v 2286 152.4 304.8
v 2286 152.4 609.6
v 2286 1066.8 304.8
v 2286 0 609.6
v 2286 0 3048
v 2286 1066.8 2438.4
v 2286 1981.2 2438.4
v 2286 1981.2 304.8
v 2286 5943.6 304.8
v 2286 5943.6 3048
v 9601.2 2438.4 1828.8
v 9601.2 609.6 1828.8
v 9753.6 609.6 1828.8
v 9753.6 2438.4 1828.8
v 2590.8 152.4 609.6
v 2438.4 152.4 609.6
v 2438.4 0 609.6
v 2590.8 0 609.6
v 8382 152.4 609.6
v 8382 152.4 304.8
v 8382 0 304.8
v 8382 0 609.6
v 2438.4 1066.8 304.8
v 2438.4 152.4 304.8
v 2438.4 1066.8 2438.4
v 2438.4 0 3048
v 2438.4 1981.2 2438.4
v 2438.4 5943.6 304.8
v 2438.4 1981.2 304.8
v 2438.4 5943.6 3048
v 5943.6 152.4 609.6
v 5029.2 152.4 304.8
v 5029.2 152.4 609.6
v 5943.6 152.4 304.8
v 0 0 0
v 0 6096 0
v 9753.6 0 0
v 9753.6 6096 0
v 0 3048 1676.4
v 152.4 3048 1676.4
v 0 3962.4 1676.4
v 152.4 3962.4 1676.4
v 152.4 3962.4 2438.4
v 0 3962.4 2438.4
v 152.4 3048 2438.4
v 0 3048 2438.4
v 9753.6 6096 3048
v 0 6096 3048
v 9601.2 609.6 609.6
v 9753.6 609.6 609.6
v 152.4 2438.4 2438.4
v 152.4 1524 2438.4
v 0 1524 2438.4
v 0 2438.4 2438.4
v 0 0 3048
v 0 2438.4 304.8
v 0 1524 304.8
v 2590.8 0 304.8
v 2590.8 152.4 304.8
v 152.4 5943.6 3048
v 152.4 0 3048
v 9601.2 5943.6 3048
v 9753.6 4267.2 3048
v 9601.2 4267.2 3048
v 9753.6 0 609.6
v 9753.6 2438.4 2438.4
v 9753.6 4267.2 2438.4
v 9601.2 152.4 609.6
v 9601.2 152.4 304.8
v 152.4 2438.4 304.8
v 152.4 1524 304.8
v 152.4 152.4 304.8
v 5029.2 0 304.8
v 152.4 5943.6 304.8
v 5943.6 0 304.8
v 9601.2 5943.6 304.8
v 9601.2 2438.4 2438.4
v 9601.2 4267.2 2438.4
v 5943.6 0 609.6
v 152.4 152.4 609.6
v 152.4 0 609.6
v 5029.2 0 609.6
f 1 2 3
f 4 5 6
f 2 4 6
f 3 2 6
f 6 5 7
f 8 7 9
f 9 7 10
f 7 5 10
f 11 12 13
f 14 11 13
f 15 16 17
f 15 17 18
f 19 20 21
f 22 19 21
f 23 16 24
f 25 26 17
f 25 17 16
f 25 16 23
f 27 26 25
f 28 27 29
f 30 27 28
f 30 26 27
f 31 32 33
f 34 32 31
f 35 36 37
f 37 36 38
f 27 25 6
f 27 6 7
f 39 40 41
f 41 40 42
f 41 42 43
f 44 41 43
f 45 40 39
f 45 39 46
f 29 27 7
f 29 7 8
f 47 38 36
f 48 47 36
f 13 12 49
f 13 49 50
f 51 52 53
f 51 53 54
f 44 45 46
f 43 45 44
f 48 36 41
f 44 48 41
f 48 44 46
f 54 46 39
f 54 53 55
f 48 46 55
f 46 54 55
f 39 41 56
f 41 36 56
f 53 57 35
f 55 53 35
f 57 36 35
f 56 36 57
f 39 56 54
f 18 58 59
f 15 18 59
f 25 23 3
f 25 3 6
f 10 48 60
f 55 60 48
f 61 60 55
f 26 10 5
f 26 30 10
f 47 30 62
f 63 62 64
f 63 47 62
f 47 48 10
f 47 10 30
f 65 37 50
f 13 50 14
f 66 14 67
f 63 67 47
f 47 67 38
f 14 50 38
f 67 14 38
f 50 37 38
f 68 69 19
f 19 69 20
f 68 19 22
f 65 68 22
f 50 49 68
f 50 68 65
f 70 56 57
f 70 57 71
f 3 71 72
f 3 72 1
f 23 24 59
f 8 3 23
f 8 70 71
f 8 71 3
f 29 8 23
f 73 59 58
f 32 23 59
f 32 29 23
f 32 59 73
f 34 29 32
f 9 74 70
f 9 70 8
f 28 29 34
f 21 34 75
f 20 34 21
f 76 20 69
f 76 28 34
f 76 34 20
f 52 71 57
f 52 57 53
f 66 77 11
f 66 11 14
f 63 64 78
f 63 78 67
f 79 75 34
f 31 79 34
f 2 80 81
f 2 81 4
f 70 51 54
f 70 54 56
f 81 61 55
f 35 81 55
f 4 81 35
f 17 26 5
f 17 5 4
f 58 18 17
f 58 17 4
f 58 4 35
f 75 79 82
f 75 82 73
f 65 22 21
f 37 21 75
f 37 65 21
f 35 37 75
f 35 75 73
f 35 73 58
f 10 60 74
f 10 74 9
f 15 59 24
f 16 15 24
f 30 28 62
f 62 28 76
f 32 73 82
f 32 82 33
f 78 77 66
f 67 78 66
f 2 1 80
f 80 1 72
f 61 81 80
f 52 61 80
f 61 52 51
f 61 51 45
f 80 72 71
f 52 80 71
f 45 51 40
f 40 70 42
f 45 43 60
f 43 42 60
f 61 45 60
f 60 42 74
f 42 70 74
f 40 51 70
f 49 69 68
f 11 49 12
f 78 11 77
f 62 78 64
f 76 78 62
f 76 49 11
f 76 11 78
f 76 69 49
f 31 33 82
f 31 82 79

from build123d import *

# Parameters (mm, degrees)
F0_W      = 9753.6
F0_H      = 6096
F1_DEPTH  = 304.8
F2_W      = 914.4
F2_H      = 152.4
F3_DEPTH  = 304.8
F5_DEPTH  = 2438.4
F6_W      = 152.4
F6_H      = 1828.8
F7_DEPTH  = 1828.8
F8_W      = 152.4
F8_H      = 1828.8
F9_DEPTH  = 1219.2
F11_START = -152.4
F11_DEPTH = 152.4
F13_START = -2438.4
F12_W     = 914.4
F12_H     = 762
F13_DEPTH = 152.4


with BuildPart() as f1:
    # F0 (on Top) → F1 (new body)
    with BuildSketch(Plane.XY):
        with Locations((4876.8, 3048)):
            Rectangle(F0_W, F0_H)
    extrude(amount=F1_DEPTH)

    # F2 (on face) → F3 (join)
    with BuildSketch(Plane.XY.offset(304.8)):
        with Locations((5486.4, 76.2)):
            Rectangle(F2_W, F2_H)
        Polygon((8382, 152.4), (8382, 0), (9753.6, 0), (9753.6, 6096), (0, 6096), (0, 5943.6), (9601.2, 5943.6), (9601.2, 152.4), align=None)
        Polygon((0, 0), (2590.8, 0), (2590.8, 152.4), (152.4, 152.4), (152.4, 914.4), (0, 914.4), align=None)
    extrude(amount=F3_DEPTH)

    # F4 (on face) → F5 (join)
    with BuildSketch(Plane.XY.offset(609.6)):
        Polygon((0, 6096), (0, 5943.6), (9601.2, 5943.6), (9601.2, 4267.2), (9753.6, 4267.2), (9753.6, 6096), align=None)
    extrude(amount=F5_DEPTH)

    # F6 (on face) → F7 (join)
    with BuildSketch(Plane.XY.offset(609.6)):
        with Locations((9677.4, 3352.8)):
            Rectangle(F6_W, F6_H)
    extrude(amount=F7_DEPTH)

    # F8 (on face) → F9 (join)
    with BuildSketch(Plane.XY.offset(609.6)):
        with Locations((9677.4, 1524)):
            Rectangle(F8_W, F8_H)
    extrude(amount=F9_DEPTH)

    # F10 (on face) → F11 (join)
    with BuildSketch(Plane.YZ.offset(2590.8).offset(F11_START)):
        Polygon((0, 3048), (0, 609.6), (152.4, 609.6), (152.4, 304.8), (1066.8, 304.8), (1066.8, 2438.4), (1981.2, 2438.4), (1981.2, 304.8), (5943.6, 304.8), (5943.6, 3048), align=None)
    extrude(amount=-F11_DEPTH)

    # F12 (on face) → F13 (join)
    with BuildSketch(Plane.YZ.offset(2590.8).offset(F13_START)):
        Polygon((0, 609.6), (0, 304.8), (152.4, 304.8), (1524, 304.8), (1524, 2438.4), (2438.4, 2438.4), (2438.4, 304.8), (5943.6, 304.8), (5943.6, 3048), (0, 3048), align=None)
        with Locations((3505.2, 2057.4)):
            Rectangle(F12_W, F12_H, mode=Mode.SUBTRACT)
    extrude(amount=-F13_DEPTH)


solid = f1.part
